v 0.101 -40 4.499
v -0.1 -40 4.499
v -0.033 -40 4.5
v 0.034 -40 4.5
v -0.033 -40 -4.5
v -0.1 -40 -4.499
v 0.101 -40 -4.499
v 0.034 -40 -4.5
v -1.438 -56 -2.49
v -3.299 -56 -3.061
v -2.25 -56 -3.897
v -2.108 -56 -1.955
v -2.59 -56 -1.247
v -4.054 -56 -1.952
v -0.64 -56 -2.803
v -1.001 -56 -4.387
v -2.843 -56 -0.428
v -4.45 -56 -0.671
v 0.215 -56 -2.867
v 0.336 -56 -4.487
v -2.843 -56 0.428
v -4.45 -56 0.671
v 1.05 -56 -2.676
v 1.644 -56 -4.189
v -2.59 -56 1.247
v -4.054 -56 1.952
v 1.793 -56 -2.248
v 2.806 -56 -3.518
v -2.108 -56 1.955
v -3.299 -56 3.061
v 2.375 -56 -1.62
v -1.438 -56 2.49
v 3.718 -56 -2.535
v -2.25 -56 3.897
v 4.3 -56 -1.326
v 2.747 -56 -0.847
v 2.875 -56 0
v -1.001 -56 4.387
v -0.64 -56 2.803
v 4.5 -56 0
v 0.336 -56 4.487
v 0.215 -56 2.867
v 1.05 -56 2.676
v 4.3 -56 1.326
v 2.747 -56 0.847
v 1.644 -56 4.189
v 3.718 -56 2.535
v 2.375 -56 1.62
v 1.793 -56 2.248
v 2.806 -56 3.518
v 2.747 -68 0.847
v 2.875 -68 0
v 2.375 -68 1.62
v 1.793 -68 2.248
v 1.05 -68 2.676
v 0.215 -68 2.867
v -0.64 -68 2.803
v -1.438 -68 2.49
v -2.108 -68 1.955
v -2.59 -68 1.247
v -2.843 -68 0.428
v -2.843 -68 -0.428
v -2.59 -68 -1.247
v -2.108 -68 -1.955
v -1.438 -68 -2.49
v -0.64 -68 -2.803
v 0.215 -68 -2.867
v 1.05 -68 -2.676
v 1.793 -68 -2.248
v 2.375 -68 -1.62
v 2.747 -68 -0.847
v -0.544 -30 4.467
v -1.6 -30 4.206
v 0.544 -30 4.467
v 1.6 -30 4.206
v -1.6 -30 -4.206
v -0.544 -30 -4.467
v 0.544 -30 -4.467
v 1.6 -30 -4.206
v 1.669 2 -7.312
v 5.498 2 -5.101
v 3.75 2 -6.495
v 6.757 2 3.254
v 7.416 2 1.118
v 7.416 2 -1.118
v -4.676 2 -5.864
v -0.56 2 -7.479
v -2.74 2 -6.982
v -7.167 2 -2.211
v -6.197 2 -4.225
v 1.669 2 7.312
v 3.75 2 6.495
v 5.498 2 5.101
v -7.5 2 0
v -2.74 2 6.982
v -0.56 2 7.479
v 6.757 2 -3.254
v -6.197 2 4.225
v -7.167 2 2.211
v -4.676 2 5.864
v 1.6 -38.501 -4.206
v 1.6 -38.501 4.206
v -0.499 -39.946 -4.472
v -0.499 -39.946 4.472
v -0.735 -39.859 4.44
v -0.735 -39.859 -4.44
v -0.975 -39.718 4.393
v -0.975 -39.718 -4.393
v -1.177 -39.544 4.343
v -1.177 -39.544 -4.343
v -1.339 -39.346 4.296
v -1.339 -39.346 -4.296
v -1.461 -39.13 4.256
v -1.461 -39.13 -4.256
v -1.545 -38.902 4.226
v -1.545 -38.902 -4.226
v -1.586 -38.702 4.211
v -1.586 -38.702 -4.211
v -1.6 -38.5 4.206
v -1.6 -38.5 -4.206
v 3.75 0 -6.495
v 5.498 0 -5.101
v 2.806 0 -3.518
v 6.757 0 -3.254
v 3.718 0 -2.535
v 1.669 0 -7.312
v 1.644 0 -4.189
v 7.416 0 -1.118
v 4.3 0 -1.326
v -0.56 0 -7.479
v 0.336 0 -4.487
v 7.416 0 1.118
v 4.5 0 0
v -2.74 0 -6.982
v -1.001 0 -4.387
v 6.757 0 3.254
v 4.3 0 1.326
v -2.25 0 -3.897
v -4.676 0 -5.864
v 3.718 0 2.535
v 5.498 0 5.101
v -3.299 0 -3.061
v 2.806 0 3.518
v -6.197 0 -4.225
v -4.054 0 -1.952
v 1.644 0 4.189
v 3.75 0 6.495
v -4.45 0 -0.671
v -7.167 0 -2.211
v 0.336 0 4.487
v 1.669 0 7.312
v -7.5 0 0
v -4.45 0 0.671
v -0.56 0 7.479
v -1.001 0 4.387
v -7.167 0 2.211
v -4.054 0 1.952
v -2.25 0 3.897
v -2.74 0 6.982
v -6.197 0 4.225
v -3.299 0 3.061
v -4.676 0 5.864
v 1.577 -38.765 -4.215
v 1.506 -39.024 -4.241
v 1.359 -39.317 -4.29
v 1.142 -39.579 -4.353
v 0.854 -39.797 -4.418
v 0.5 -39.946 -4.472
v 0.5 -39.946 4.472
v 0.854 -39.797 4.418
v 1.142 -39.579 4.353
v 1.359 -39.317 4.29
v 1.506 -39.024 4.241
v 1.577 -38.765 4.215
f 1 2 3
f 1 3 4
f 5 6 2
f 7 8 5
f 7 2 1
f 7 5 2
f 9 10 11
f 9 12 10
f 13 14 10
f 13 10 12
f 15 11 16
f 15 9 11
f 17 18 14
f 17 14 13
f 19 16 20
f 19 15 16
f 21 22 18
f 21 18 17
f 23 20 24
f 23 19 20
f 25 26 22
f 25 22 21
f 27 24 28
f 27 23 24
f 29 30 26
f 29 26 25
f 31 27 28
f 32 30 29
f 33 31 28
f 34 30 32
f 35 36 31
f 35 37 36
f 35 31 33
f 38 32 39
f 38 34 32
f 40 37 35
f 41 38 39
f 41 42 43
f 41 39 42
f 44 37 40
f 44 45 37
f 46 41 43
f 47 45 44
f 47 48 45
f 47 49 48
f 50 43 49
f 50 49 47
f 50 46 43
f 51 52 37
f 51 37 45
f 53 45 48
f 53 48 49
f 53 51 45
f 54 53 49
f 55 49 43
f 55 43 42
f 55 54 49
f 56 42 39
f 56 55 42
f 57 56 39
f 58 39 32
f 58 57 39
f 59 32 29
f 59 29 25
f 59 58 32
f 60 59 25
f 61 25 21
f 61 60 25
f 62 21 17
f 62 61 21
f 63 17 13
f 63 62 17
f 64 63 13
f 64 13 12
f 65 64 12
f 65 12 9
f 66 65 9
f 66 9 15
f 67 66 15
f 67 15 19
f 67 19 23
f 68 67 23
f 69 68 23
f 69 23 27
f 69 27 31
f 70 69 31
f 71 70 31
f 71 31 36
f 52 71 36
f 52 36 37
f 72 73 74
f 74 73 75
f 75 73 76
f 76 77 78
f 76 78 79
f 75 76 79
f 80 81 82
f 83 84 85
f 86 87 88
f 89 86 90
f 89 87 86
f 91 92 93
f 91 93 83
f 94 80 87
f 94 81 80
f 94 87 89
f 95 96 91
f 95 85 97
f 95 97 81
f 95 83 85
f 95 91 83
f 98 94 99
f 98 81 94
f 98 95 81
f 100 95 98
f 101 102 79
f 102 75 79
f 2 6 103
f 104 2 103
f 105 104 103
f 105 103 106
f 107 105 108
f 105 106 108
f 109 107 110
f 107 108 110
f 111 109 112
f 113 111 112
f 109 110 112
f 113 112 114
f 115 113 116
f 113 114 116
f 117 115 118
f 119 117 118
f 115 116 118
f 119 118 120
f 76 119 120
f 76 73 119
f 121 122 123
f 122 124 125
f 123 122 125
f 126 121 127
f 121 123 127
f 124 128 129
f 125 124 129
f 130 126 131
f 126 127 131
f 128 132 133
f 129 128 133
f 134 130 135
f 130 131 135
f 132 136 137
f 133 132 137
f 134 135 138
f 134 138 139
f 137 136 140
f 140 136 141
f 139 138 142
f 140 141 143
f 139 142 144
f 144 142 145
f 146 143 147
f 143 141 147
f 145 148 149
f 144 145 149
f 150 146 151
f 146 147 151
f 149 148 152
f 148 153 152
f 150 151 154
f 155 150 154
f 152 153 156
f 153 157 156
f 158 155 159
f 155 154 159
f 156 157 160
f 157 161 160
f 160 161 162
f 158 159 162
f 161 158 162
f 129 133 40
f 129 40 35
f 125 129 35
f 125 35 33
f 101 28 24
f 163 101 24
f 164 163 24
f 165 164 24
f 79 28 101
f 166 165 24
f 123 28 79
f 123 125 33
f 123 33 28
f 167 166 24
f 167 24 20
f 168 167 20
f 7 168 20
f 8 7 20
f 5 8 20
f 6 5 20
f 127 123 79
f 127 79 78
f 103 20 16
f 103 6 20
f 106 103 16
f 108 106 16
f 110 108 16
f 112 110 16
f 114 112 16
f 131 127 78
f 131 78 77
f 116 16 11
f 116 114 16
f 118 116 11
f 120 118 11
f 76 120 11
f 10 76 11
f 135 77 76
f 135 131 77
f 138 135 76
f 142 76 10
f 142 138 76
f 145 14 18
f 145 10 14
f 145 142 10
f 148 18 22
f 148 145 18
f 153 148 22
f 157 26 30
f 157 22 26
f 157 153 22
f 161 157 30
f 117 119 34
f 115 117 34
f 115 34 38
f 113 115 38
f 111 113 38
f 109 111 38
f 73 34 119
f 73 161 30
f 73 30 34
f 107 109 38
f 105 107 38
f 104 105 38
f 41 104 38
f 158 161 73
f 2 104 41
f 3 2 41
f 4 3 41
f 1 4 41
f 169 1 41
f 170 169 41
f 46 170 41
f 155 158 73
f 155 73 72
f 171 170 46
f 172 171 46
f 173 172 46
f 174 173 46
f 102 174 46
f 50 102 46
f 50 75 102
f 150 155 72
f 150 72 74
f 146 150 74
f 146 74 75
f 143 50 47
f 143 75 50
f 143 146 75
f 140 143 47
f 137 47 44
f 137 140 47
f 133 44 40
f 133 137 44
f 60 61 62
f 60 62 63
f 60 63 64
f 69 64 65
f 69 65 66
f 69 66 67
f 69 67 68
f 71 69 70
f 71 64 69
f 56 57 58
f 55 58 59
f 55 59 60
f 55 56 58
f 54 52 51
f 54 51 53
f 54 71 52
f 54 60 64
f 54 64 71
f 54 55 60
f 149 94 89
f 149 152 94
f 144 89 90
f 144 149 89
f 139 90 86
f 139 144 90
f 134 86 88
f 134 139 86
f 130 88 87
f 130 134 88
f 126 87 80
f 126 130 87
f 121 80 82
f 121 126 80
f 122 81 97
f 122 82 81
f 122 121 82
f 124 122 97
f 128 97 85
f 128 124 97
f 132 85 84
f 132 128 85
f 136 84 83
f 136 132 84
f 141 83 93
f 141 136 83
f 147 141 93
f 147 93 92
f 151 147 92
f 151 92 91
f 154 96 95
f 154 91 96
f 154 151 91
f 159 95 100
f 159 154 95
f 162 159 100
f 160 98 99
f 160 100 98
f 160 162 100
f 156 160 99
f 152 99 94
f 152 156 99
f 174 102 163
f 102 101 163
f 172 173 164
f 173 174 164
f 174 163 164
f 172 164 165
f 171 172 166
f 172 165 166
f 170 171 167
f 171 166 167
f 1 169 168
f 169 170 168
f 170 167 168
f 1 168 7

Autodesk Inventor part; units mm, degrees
ref_plane "YZ Plane" through (0, 0, 0) normal (1, 0, 0) x (0, 1, 0)
ref_plane "XZ Plane" through (0, 0, 0) normal (0, 1, 0) x (-1, 0, 0)
ref_plane "XY Plane" through (0, 0, 0) normal (0, 0, 1) x (1, 0, 0)
sketch "Sketch1" plane through (0, 0, 0) normal (0, 1, 0) x (-1, 0, 0)
  circle A0 centre (0, 0) radius 7.5
  dimension "d0" = 15
extrude "Extrusion1" add sketch "Sketch1" along normal blind 2
sketch "Sketch2" plane through (0, 0, 0) normal (0, -1, 0) x (1, 0, 0)
  circle A0 centre (0, 0) radius 4.5
extrude "Extrusion2" add sketch "Sketch2" along normal blind 68
sketch "Sketch4" plane through (0, 2, 0) normal (0, 1, 0) x (1, 0, 0)
  circle A0 centre (0, 0) radius 4.5
  circle A1 centre (0, 0) radius 4.5 projected
  line L0 (-1.6, -4.2059) -> (-1.6, 4.2059)
  line L1 (1.6, -4.2059) -> (1.6, 4.2059)
  dimension "d6" = 9
extrude "Extrusion3" cut sketch "Sketch4" against normal blind 42 contours L1 A0 L0
sketch "Sketch5" plane through (0, 2, 0) normal (0, 1, 0) x (1, 0, 0)
  circle A0 centre (0, 0) radius 4.5
  arc A1 (-1.6, -4.2059) -> (1.6, -4.2059) centre (0, 0) ccw projected
  line L0 (-1.6, -4.2059) -> (-1.6, 4.2059) projected
  line L1 (-1.6, -4.2059) -> (-1.6, 4.2059)
  line L2 (1.6, 4.2059) -> (1.6, -4.2059) projected
  arc A2 (1.6, 4.2059) -> (-1.6, 4.2059) centre (0, 0) ccw projected
  line L3 (1.6, -4.2059) -> (1.6, 4.2059)
  dimension "d9" = 9
extrude "Extrusion4" add sketch "Sketch5" against normal blind 32 contours L2 A0 L0
fillet "Fillet1" radius 1.5 1 edges at (-1.6, -40, 0)
fillet "Fillet2" radius 1.499 1 edges at (1.6, -40, 0)
sketch "Sketch6" plane through (0, -40, 0) normal (0, 1, 0) x (1, 0, 0)
  point P0 (0, 0)
ref_plane "Work Plane2" through (0.101, -40, -4.4989) normal (0.0224, 0, -0.9997) x (0, 1, 0)
sketch "Sketch8" plane through (0, -68, 0) normal (0, -1, 0) x (1, 0, 0)
  circle A0 centre (0, 0) radius 2.875
  circle A1 centre (0, 0) radius 4.5
  dimension "d23" = 5.75
extrude "Extrusion5" cut sketch "Sketch8" against normal blind 12
sketch "Sketch9" plane through (0.101, -40, -4.4989) normal (0.0224, 0, -0.9997) x (0, 1, 0)
  line L0 (-16, -4.5) -> (-16, 4.5) projected
  line L1 (-16, 0) -> (10, -0.0944)
  line L2 (10, 1.5052) -> (10, -1.694) projected
  point P0 (40, 0)
properties part number "pin"
